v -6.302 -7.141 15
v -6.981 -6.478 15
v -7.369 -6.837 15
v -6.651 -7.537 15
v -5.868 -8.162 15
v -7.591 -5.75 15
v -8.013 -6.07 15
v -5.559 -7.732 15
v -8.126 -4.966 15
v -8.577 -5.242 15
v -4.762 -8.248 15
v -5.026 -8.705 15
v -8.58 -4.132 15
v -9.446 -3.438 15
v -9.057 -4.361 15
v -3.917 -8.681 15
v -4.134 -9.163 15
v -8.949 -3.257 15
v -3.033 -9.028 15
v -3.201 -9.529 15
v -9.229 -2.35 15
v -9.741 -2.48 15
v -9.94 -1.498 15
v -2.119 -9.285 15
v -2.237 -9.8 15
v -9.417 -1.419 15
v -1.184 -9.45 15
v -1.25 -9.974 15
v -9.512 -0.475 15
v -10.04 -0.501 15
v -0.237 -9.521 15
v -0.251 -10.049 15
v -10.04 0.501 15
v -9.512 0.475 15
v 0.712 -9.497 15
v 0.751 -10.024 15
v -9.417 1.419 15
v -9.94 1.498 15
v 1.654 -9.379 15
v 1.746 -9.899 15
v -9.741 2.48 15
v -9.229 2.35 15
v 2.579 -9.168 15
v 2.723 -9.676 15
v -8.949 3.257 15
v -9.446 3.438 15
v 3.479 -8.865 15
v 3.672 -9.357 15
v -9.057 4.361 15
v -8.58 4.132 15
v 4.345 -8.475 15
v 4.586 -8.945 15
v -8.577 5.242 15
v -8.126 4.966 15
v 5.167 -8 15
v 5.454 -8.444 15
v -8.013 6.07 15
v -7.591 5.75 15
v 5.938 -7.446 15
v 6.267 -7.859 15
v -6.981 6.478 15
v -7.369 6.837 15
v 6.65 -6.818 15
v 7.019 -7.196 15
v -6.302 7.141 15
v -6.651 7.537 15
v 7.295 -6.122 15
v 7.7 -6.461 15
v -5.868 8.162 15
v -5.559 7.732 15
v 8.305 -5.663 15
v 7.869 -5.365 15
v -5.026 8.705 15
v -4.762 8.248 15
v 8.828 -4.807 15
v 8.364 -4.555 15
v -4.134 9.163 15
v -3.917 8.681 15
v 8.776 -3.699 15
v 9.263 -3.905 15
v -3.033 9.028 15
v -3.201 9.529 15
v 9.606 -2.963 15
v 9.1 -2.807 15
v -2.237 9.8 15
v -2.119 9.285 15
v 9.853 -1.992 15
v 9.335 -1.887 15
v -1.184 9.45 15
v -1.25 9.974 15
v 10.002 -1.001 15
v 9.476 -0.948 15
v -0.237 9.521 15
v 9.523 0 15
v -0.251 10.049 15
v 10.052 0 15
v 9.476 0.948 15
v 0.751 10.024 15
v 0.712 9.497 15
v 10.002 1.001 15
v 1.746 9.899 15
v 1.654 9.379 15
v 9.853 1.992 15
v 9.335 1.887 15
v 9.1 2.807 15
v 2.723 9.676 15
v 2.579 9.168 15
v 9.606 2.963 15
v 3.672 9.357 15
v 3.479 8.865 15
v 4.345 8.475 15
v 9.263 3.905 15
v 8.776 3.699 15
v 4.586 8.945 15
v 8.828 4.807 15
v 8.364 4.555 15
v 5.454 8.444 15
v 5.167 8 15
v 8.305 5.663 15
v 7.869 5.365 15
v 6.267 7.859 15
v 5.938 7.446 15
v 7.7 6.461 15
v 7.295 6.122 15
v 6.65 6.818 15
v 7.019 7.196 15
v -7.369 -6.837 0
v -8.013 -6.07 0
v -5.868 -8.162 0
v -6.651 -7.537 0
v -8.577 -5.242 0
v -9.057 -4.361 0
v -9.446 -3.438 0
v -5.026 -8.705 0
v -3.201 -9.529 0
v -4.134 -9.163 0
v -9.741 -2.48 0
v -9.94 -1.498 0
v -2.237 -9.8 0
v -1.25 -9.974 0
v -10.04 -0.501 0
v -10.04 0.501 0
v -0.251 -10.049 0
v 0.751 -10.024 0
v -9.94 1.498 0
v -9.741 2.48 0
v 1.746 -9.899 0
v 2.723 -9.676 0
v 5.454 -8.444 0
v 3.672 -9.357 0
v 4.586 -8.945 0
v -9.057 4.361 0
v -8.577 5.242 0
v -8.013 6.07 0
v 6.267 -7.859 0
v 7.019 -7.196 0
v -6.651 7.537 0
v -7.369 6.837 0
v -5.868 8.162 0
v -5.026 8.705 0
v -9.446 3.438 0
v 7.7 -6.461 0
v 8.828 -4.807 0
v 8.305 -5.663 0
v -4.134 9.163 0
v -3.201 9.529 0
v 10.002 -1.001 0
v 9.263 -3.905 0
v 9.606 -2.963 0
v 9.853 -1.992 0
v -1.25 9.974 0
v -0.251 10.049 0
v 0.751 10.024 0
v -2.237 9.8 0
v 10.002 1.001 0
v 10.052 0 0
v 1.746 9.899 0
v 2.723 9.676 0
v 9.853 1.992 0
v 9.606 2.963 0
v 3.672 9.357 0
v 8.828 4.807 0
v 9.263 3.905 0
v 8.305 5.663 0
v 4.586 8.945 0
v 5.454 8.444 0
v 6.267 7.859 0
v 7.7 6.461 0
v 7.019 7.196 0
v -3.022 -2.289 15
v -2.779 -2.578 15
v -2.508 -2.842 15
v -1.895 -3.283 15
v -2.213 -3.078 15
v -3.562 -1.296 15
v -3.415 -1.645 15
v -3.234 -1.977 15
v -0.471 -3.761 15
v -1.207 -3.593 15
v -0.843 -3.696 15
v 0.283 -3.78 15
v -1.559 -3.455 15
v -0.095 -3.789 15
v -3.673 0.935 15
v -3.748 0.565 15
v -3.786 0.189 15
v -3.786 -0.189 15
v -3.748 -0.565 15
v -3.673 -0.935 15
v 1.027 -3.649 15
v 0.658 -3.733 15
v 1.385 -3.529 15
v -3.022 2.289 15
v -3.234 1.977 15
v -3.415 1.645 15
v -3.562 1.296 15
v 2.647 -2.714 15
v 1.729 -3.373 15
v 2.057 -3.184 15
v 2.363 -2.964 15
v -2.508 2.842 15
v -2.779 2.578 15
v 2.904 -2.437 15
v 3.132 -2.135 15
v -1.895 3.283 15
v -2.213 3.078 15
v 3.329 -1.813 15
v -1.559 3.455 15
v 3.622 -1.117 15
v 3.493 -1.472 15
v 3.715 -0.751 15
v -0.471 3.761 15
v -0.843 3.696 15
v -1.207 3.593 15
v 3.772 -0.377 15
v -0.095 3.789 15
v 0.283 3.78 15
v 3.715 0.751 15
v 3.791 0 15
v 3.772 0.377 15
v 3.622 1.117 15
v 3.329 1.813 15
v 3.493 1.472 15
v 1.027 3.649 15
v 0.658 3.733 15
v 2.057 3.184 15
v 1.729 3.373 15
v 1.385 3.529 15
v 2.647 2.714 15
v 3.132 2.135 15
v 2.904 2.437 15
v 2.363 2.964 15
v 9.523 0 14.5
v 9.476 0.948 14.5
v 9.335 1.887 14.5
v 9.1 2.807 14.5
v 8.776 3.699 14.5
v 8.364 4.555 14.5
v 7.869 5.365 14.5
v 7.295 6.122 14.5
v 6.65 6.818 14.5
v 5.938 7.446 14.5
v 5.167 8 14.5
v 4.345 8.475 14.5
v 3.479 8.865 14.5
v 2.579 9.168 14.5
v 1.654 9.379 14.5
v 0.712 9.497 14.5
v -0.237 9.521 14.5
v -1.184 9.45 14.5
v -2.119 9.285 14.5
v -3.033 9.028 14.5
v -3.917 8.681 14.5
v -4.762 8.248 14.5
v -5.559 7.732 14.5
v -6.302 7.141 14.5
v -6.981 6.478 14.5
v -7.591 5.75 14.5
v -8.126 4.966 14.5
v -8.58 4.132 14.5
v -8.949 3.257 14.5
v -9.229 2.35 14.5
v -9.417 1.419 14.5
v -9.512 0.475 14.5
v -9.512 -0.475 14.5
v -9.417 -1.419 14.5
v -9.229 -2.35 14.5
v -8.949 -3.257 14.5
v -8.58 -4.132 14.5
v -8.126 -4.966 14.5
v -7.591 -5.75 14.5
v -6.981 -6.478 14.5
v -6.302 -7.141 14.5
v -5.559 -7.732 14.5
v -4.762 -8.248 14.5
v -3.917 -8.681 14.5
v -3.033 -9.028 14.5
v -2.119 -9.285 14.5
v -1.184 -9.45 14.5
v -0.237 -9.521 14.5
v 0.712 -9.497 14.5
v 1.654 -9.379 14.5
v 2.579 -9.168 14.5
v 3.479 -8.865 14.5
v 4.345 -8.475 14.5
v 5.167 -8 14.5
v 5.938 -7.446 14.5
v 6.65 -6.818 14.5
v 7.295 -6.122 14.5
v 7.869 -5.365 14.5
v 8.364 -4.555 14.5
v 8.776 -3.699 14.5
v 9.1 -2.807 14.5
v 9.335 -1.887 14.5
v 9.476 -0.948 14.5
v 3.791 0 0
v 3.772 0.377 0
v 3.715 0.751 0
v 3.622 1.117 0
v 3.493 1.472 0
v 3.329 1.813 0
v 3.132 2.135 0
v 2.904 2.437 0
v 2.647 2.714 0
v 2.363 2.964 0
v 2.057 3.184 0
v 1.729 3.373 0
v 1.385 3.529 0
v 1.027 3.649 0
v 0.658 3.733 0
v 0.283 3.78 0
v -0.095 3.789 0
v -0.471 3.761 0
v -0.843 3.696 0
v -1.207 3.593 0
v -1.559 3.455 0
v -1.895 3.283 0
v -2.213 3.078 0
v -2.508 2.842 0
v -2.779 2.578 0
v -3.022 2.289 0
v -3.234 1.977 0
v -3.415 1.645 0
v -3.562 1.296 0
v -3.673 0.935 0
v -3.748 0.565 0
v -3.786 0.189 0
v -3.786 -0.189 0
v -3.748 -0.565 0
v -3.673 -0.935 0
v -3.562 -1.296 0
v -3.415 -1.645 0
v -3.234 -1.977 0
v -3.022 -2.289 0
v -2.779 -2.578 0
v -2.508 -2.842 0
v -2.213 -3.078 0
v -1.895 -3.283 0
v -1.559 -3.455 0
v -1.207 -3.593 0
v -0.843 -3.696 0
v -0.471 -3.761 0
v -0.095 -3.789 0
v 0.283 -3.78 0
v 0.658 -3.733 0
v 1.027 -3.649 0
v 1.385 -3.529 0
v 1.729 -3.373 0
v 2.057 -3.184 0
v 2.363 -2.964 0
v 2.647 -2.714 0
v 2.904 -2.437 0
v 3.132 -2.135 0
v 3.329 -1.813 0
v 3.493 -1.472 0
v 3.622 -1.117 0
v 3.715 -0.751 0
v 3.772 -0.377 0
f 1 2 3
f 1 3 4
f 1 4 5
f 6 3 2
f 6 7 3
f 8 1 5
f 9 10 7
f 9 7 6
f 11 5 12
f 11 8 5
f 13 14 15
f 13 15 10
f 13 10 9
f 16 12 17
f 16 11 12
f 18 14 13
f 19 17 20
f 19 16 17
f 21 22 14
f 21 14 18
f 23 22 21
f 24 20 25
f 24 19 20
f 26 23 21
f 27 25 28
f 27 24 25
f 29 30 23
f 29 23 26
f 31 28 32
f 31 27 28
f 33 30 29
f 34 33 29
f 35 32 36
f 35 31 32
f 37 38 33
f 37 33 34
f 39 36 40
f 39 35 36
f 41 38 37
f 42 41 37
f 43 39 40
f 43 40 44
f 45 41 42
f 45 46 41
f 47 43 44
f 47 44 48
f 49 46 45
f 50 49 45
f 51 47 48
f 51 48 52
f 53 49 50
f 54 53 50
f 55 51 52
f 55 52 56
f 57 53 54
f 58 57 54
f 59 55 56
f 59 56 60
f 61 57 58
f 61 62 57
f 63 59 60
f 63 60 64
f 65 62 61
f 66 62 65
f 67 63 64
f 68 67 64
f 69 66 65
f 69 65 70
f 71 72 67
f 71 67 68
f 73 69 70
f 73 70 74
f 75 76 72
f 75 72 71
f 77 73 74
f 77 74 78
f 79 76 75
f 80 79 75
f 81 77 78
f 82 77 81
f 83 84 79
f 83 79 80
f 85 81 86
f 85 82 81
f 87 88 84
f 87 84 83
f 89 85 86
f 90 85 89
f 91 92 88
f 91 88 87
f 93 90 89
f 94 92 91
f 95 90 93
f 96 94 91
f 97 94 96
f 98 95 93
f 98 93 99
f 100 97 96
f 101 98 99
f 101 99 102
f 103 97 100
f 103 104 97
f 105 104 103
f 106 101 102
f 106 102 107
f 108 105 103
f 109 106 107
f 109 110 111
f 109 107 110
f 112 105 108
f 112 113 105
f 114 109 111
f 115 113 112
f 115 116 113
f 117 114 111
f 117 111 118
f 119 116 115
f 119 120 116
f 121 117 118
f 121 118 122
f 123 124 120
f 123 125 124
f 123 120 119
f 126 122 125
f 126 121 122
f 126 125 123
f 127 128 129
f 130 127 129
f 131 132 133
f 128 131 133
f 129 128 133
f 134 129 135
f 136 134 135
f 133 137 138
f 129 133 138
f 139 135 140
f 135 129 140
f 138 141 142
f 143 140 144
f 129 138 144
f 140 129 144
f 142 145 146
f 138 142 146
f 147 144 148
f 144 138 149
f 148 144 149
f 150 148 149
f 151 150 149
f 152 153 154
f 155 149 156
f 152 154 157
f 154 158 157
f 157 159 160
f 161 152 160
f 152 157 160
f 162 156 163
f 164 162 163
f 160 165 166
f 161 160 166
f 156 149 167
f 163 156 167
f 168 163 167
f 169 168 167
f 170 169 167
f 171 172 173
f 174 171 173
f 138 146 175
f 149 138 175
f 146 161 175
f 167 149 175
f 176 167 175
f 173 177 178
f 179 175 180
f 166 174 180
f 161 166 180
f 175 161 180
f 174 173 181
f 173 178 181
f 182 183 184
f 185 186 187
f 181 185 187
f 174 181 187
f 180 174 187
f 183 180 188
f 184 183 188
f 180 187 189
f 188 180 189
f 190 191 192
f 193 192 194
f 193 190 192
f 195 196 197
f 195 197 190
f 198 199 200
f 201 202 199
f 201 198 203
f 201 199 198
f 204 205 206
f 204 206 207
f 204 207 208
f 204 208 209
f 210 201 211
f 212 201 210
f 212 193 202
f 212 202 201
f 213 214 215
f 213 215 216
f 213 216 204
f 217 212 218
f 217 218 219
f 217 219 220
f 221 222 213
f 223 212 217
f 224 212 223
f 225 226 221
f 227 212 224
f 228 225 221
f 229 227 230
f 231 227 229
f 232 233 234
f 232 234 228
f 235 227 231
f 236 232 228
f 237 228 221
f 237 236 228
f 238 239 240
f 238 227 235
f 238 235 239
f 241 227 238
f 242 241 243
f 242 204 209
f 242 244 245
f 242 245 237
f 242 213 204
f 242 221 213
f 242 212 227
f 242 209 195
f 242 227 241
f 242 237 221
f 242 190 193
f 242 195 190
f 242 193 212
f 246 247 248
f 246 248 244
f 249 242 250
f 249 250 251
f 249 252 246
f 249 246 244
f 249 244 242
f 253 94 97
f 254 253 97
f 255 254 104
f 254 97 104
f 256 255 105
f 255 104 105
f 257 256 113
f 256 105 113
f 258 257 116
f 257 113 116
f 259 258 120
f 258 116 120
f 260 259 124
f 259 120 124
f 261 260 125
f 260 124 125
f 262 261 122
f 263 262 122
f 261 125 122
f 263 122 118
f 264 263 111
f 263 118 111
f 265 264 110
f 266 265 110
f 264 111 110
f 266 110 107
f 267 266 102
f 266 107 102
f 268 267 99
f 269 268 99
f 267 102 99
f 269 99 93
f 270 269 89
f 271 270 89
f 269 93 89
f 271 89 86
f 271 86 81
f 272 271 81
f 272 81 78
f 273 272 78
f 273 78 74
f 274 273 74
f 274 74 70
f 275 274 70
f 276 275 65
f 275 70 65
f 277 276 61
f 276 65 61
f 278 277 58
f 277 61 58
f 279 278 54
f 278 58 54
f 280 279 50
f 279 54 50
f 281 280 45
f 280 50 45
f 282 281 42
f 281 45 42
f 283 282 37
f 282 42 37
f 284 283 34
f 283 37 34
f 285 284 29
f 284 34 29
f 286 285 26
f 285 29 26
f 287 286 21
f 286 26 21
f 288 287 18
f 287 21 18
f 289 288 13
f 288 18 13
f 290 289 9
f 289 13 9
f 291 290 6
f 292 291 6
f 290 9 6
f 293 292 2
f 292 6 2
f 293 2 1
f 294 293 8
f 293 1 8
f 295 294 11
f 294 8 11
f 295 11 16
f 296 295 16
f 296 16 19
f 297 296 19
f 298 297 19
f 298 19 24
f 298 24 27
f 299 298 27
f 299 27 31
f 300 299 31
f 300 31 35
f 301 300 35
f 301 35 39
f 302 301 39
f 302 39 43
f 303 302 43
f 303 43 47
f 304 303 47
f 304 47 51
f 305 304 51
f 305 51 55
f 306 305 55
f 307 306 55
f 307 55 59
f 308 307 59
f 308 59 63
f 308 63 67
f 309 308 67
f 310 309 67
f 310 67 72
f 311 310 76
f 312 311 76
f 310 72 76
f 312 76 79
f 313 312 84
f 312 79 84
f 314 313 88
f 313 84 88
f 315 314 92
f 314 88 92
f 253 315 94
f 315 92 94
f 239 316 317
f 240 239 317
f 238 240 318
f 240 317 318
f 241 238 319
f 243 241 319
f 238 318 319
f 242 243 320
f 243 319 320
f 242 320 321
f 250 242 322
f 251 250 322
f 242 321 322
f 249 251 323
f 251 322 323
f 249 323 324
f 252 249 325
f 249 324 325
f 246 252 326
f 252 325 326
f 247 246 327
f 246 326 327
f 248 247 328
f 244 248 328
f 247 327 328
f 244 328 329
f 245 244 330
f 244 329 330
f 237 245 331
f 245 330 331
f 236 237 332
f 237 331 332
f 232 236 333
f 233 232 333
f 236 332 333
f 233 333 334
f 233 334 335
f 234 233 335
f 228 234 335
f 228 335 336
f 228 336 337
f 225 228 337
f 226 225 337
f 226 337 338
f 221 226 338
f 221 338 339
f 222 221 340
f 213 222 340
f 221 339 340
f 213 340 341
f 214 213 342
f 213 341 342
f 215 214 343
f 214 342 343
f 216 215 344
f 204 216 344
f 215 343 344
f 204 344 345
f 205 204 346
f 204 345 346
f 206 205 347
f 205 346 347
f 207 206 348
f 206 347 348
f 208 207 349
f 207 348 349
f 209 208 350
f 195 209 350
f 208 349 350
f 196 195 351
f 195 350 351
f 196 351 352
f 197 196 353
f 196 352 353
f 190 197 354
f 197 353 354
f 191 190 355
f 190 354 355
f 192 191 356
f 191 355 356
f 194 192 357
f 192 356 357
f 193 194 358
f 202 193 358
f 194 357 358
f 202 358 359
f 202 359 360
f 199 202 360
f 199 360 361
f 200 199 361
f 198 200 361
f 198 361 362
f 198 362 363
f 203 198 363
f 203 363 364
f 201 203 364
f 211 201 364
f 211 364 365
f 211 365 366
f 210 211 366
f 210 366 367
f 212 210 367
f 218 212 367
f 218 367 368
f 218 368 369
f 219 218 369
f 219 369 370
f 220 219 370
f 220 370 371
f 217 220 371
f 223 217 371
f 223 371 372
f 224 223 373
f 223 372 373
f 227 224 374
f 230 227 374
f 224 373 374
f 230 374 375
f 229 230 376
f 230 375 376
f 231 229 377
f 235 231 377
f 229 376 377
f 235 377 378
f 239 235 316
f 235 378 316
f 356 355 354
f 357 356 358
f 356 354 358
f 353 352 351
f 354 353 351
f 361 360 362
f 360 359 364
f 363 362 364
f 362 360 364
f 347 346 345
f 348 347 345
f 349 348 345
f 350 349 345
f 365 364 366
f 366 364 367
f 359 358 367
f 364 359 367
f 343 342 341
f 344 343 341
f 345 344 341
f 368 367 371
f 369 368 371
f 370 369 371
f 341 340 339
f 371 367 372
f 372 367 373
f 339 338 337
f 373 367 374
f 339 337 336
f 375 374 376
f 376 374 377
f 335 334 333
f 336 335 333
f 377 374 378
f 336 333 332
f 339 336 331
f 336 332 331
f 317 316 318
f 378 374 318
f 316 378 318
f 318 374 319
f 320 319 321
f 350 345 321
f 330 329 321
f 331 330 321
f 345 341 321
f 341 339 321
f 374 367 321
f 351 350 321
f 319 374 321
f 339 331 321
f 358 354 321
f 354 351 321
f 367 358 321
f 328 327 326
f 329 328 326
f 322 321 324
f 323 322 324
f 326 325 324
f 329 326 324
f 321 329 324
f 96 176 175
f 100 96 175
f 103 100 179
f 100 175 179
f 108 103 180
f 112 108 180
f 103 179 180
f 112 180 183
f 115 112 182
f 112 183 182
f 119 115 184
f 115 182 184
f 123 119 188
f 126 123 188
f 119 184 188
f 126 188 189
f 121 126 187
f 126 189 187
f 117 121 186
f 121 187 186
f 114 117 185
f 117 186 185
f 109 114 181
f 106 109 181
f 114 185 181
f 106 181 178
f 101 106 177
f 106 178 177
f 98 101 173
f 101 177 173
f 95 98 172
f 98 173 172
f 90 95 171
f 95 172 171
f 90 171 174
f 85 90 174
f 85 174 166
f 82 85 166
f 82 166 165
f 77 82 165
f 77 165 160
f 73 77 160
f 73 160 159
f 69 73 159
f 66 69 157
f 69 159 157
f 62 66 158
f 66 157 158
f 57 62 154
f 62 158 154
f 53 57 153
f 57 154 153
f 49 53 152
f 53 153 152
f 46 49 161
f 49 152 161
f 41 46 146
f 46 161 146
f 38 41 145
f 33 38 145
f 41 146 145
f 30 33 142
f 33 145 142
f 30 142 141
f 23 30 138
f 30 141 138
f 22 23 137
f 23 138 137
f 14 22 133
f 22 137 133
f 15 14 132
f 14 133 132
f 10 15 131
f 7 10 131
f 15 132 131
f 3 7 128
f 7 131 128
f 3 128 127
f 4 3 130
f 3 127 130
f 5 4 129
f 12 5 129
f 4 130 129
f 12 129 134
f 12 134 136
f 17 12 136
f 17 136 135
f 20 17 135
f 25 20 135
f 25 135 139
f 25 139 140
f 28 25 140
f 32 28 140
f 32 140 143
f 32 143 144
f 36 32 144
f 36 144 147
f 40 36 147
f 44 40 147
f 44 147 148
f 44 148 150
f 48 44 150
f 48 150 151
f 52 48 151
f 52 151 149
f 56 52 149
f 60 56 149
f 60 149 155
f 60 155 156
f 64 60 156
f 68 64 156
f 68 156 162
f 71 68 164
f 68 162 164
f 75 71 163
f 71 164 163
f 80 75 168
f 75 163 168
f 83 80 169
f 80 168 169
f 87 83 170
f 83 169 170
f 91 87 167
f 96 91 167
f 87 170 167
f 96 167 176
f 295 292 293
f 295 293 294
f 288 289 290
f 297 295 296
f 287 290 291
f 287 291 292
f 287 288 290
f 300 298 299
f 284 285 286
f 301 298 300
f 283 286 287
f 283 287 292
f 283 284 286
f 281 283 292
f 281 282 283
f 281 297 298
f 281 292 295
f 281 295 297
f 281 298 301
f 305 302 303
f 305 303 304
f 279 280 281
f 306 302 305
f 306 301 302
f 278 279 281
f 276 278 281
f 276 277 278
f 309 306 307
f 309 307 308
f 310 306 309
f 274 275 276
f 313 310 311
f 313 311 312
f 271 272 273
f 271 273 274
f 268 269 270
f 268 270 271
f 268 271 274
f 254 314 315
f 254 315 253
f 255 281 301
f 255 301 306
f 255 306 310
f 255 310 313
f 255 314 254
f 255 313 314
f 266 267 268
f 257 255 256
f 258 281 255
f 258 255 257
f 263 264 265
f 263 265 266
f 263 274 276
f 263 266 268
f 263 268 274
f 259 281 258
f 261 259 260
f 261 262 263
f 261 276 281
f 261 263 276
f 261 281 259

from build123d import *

# Parameters (mm, degrees)
SKETCH_R     = 10.052147
PAD_DEPTH    = 15
SKETCH002_R  = 9.523498
POCKET_DEPTH = 0.5
SKETCH001_R  = 3.79058
PAD001_DEPTH = 15


with BuildPart() as cilindro_externo:
    # Sketch → Pad (new body)
    with BuildSketch(Plane.XY):
        Circle(SKETCH_R)
    extrude(amount=PAD_DEPTH)

    # Sketch002 (on Face3 of Pad) → Pocket (cut)
    with BuildSketch(Plane.XY.offset(15)):
        Circle(SKETCH002_R)
    extrude(amount=-POCKET_DEPTH, mode=Mode.SUBTRACT)


with BuildPart() as cilindro_interno:
    # Sketch001 → Pad001 (new body)
    with BuildSketch(Plane.XY):
        Circle(SKETCH001_R)
    extrude(amount=PAD001_DEPTH)


solid = Compound([cilindro_externo.part, cilindro_interno.part])
